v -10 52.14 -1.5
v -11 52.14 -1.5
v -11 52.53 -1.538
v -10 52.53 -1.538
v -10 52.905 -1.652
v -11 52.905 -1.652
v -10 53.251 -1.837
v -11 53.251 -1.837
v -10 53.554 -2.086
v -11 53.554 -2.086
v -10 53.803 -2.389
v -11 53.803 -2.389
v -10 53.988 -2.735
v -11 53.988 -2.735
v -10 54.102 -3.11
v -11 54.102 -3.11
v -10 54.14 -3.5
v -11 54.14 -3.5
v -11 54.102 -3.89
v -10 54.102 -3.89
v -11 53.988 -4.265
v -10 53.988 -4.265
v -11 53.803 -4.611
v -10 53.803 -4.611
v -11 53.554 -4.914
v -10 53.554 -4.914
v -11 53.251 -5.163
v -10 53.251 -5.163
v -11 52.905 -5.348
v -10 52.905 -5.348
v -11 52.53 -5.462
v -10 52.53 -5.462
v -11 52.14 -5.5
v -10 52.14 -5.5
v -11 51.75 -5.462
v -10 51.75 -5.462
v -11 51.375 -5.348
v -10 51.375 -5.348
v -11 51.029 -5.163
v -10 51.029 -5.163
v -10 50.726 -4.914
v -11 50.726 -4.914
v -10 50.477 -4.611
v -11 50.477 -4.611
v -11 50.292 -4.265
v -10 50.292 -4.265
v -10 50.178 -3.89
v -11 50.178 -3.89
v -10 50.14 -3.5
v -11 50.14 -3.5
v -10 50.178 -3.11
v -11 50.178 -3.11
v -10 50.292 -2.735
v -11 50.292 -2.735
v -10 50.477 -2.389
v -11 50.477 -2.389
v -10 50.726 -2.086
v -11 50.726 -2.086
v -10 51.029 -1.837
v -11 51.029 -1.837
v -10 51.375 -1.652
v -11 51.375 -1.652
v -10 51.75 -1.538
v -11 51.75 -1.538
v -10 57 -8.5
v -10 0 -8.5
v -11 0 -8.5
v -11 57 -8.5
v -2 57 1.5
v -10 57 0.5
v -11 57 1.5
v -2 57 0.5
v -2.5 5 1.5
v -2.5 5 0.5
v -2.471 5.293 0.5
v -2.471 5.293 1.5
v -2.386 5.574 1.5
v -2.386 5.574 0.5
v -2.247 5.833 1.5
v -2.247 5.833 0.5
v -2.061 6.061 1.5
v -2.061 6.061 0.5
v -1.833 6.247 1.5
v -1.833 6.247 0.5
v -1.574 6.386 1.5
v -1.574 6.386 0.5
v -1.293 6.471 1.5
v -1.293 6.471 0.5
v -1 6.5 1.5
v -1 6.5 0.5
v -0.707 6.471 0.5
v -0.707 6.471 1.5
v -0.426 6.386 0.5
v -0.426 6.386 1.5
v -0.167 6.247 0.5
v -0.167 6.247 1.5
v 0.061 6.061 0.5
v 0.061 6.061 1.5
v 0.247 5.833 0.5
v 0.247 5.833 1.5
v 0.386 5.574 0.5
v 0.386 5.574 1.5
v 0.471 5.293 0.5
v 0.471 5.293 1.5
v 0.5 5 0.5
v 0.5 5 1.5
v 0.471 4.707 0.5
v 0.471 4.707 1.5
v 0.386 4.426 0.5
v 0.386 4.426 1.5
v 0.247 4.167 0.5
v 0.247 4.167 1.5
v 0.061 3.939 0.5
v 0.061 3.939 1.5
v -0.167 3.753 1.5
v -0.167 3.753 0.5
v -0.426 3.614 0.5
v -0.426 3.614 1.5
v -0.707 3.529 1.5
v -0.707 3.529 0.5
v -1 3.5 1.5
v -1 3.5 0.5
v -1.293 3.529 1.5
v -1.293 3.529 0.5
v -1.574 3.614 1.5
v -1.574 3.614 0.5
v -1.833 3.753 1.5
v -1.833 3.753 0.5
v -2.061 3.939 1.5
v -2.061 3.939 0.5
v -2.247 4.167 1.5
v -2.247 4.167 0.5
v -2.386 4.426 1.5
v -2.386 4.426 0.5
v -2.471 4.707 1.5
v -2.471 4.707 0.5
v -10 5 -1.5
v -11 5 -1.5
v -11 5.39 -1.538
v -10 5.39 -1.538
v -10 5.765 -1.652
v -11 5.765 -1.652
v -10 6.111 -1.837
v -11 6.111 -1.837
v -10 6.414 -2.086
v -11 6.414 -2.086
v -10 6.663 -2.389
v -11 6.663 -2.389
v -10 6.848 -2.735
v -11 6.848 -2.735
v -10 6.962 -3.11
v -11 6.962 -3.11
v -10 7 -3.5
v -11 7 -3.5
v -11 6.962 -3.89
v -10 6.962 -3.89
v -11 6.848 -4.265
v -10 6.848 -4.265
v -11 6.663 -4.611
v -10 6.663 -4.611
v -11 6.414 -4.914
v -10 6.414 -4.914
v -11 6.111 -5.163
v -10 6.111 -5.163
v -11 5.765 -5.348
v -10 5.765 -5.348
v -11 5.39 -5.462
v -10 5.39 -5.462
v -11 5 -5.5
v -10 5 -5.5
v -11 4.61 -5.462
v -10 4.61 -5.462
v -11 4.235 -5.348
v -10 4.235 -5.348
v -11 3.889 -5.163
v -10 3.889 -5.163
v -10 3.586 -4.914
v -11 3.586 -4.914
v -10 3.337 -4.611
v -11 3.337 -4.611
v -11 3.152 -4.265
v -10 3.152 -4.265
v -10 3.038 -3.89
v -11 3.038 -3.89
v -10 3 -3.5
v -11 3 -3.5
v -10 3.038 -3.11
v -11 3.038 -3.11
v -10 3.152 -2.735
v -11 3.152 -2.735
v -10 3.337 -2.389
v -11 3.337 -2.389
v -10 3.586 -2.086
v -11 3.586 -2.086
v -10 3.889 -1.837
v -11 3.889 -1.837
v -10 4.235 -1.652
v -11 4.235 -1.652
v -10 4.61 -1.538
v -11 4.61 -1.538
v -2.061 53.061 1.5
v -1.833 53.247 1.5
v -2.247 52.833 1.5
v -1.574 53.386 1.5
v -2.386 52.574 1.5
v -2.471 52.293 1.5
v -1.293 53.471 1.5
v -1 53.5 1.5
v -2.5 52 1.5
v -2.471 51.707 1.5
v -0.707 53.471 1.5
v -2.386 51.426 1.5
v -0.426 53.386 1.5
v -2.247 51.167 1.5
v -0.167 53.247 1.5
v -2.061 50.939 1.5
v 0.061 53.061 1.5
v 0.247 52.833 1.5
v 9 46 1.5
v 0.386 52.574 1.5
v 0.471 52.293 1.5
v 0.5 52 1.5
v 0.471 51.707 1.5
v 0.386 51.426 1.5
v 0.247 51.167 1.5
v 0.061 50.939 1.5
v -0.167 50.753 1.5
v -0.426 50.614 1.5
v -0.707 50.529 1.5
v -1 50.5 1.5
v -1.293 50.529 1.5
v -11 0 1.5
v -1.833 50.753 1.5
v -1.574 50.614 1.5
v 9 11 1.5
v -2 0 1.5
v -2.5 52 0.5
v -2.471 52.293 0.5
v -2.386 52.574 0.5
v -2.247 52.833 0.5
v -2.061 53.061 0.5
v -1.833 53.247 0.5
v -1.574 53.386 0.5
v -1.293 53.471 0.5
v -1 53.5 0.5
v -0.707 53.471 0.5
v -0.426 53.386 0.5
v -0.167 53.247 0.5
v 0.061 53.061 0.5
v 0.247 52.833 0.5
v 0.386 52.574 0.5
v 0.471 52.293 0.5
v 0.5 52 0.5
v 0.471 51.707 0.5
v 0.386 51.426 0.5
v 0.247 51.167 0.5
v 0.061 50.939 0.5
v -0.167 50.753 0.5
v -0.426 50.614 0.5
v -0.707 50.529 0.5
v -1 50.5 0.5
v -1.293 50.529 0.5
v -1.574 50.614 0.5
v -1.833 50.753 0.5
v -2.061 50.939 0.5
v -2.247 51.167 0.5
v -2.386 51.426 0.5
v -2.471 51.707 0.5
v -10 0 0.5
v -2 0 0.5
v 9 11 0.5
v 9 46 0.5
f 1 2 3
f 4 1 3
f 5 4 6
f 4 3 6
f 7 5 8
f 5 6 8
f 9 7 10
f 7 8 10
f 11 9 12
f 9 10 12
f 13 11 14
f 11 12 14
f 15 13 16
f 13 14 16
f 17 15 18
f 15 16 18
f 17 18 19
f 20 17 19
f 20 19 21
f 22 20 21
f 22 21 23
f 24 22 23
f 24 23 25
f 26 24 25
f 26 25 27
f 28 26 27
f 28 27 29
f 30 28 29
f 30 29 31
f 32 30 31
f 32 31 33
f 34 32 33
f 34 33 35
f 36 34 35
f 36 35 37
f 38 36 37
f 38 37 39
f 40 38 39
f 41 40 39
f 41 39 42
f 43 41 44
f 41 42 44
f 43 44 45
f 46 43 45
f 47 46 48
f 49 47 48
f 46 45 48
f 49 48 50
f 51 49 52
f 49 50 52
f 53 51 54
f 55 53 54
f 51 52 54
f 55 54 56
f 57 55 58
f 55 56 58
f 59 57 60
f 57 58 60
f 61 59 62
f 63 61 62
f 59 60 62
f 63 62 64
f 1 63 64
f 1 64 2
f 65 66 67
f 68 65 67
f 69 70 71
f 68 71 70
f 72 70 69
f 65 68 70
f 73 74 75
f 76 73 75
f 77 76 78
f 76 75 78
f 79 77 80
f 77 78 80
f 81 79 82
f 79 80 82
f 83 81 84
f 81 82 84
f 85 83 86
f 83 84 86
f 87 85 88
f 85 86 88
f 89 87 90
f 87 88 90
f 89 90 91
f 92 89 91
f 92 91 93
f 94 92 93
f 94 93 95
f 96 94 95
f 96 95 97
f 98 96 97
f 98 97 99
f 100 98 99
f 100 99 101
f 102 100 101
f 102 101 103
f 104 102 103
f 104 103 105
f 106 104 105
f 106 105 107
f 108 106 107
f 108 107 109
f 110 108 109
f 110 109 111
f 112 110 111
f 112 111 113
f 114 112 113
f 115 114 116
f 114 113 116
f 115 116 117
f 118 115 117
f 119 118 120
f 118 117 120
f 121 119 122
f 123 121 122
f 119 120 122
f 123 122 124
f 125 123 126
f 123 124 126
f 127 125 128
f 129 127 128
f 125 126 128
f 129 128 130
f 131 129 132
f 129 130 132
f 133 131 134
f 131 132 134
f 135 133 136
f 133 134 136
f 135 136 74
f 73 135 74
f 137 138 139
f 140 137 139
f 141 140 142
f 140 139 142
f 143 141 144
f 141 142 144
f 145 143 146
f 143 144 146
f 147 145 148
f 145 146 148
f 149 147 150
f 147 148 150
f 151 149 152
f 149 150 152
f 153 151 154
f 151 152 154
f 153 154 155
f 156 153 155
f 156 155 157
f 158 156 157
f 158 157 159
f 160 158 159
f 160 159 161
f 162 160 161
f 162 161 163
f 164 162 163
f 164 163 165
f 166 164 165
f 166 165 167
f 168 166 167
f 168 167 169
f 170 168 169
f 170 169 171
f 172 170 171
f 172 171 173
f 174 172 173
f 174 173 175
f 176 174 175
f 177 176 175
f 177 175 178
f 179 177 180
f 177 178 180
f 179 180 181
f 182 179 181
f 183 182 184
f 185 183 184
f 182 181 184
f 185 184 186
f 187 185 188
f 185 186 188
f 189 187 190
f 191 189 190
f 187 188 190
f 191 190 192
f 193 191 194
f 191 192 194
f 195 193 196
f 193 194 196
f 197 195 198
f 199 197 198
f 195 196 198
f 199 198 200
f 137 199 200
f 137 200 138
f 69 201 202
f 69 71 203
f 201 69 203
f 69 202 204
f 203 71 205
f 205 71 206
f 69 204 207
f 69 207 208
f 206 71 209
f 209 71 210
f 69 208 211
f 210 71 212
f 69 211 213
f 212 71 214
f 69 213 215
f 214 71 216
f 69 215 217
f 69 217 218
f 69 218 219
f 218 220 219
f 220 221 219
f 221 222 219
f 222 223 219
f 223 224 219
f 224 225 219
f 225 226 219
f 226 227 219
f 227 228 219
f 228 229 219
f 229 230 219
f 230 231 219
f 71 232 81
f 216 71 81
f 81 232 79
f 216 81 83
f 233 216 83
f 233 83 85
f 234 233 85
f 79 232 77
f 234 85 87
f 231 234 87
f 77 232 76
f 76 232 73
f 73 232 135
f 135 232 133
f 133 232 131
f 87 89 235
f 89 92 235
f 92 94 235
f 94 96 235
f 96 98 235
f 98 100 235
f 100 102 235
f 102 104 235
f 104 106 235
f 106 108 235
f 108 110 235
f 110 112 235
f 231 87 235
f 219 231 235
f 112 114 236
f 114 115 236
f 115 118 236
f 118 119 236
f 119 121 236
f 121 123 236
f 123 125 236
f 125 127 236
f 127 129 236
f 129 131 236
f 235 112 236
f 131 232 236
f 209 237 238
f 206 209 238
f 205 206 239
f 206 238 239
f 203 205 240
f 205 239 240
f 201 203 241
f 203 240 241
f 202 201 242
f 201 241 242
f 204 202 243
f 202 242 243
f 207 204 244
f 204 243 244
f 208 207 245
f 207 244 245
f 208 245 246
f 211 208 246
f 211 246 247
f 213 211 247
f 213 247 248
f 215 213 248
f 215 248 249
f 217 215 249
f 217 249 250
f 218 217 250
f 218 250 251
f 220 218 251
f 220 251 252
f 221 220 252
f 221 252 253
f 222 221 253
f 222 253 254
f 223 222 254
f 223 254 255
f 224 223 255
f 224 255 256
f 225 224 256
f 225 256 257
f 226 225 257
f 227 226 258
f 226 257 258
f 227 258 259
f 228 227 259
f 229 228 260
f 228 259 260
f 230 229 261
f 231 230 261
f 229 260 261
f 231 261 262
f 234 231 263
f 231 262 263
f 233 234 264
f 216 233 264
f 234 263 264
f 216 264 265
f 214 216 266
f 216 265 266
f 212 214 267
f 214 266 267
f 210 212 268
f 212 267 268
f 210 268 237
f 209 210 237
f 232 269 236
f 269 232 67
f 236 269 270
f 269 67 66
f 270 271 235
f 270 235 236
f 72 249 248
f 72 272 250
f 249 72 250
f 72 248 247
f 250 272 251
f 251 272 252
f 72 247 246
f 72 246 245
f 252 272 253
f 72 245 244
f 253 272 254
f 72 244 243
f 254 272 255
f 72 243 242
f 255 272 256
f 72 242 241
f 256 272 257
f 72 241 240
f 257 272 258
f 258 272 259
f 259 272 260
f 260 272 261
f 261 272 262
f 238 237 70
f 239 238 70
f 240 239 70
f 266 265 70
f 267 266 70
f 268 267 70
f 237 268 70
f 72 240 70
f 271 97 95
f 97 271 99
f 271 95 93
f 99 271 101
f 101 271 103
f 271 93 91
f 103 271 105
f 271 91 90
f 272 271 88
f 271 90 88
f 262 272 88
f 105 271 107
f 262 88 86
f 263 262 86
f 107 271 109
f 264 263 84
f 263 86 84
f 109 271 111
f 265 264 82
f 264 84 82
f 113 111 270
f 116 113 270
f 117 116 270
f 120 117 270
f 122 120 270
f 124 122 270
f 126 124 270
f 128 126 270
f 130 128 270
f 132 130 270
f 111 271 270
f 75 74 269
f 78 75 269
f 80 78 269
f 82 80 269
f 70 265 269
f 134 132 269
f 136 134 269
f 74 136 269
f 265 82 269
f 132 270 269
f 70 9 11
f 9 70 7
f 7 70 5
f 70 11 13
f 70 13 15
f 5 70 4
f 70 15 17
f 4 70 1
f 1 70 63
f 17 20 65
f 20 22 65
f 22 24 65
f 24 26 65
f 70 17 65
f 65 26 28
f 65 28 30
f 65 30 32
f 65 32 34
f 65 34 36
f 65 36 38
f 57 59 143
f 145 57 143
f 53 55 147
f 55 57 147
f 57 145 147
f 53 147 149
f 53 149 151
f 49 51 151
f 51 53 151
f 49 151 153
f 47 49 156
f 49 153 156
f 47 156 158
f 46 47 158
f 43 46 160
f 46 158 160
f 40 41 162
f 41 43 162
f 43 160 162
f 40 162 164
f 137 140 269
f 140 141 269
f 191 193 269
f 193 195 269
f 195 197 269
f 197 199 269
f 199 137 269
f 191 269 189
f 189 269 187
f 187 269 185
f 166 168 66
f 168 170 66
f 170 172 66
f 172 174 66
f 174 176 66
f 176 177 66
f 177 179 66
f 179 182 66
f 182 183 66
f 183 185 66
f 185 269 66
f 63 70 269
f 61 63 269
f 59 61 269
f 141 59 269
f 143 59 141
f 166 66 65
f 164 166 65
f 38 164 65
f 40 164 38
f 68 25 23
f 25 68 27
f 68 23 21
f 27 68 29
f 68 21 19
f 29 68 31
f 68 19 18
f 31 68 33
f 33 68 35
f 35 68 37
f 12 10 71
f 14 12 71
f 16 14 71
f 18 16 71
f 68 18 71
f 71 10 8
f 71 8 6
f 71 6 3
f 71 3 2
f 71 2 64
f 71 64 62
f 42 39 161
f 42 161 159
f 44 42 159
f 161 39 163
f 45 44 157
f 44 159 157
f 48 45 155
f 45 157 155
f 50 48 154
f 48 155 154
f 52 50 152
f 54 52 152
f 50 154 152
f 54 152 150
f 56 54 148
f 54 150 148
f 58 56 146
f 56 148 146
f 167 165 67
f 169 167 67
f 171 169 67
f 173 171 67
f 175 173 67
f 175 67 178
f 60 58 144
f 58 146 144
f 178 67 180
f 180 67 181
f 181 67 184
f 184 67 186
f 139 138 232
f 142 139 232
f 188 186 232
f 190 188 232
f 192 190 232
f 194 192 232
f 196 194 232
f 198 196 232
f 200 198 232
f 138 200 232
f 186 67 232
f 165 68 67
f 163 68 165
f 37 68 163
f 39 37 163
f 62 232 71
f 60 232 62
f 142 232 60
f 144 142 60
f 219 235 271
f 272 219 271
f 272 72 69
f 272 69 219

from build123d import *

# Parameters (mm, degrees)
BOSS_EXTRU_1_DEPTH      = 57
ESQUISSE2_R             = 2
ENL_V_MAT_EXTRU_1_DEPTH = 50
ESQUISSE3_R             = 1.5
ENL_V_MAT_EXTRU_2_DEPTH = 50


with BuildPart() as part:
    # Esquisse1 → Boss.-Extru.1 (new body)
    with BuildSketch(Plane(origin=(0, 0, 0), x_dir=(1, 0, 0), z_dir=(0, 1, 0))):
        Polygon((-11, 8.5), (-11, -1.5), (9, -1.5), (9, -0.5), (-10, -0.5), (-10, 8.5), align=None)
    extrude(amount=BOSS_EXTRU_1_DEPTH)

    # Esquisse2 → Enlèv. mat.-Extru.1 (cut)
    with BuildSketch(Plane.ZY.offset(11)):
        with Locations((-3.5, 52.14)):
            Circle(ESQUISSE2_R)
        with Locations((-3.5, 5)):
            Circle(ESQUISSE2_R)
    extrude(amount=-ENL_V_MAT_EXTRU_1_DEPTH, mode=Mode.SUBTRACT)

    # Esquisse3 → Enlèv. mat.-Extru.2 (cut)
    with BuildSketch(Plane(origin=(0, 0, 0.5), x_dir=(-1, 0, 0), z_dir=(0, 0, -1))):
        with Locations((1, 52)):
            Circle(ESQUISSE3_R)
        with Locations((1, 5)):
            Circle(ESQUISSE3_R)
        Polygon((2, 57), (-9, 46), (-9, 57), align=None)
        Polygon((-9, 0), (-9, 11), (2, 0), align=None)
    extrude(amount=-ENL_V_MAT_EXTRU_2_DEPTH, mode=Mode.SUBTRACT)


solid = part.part
